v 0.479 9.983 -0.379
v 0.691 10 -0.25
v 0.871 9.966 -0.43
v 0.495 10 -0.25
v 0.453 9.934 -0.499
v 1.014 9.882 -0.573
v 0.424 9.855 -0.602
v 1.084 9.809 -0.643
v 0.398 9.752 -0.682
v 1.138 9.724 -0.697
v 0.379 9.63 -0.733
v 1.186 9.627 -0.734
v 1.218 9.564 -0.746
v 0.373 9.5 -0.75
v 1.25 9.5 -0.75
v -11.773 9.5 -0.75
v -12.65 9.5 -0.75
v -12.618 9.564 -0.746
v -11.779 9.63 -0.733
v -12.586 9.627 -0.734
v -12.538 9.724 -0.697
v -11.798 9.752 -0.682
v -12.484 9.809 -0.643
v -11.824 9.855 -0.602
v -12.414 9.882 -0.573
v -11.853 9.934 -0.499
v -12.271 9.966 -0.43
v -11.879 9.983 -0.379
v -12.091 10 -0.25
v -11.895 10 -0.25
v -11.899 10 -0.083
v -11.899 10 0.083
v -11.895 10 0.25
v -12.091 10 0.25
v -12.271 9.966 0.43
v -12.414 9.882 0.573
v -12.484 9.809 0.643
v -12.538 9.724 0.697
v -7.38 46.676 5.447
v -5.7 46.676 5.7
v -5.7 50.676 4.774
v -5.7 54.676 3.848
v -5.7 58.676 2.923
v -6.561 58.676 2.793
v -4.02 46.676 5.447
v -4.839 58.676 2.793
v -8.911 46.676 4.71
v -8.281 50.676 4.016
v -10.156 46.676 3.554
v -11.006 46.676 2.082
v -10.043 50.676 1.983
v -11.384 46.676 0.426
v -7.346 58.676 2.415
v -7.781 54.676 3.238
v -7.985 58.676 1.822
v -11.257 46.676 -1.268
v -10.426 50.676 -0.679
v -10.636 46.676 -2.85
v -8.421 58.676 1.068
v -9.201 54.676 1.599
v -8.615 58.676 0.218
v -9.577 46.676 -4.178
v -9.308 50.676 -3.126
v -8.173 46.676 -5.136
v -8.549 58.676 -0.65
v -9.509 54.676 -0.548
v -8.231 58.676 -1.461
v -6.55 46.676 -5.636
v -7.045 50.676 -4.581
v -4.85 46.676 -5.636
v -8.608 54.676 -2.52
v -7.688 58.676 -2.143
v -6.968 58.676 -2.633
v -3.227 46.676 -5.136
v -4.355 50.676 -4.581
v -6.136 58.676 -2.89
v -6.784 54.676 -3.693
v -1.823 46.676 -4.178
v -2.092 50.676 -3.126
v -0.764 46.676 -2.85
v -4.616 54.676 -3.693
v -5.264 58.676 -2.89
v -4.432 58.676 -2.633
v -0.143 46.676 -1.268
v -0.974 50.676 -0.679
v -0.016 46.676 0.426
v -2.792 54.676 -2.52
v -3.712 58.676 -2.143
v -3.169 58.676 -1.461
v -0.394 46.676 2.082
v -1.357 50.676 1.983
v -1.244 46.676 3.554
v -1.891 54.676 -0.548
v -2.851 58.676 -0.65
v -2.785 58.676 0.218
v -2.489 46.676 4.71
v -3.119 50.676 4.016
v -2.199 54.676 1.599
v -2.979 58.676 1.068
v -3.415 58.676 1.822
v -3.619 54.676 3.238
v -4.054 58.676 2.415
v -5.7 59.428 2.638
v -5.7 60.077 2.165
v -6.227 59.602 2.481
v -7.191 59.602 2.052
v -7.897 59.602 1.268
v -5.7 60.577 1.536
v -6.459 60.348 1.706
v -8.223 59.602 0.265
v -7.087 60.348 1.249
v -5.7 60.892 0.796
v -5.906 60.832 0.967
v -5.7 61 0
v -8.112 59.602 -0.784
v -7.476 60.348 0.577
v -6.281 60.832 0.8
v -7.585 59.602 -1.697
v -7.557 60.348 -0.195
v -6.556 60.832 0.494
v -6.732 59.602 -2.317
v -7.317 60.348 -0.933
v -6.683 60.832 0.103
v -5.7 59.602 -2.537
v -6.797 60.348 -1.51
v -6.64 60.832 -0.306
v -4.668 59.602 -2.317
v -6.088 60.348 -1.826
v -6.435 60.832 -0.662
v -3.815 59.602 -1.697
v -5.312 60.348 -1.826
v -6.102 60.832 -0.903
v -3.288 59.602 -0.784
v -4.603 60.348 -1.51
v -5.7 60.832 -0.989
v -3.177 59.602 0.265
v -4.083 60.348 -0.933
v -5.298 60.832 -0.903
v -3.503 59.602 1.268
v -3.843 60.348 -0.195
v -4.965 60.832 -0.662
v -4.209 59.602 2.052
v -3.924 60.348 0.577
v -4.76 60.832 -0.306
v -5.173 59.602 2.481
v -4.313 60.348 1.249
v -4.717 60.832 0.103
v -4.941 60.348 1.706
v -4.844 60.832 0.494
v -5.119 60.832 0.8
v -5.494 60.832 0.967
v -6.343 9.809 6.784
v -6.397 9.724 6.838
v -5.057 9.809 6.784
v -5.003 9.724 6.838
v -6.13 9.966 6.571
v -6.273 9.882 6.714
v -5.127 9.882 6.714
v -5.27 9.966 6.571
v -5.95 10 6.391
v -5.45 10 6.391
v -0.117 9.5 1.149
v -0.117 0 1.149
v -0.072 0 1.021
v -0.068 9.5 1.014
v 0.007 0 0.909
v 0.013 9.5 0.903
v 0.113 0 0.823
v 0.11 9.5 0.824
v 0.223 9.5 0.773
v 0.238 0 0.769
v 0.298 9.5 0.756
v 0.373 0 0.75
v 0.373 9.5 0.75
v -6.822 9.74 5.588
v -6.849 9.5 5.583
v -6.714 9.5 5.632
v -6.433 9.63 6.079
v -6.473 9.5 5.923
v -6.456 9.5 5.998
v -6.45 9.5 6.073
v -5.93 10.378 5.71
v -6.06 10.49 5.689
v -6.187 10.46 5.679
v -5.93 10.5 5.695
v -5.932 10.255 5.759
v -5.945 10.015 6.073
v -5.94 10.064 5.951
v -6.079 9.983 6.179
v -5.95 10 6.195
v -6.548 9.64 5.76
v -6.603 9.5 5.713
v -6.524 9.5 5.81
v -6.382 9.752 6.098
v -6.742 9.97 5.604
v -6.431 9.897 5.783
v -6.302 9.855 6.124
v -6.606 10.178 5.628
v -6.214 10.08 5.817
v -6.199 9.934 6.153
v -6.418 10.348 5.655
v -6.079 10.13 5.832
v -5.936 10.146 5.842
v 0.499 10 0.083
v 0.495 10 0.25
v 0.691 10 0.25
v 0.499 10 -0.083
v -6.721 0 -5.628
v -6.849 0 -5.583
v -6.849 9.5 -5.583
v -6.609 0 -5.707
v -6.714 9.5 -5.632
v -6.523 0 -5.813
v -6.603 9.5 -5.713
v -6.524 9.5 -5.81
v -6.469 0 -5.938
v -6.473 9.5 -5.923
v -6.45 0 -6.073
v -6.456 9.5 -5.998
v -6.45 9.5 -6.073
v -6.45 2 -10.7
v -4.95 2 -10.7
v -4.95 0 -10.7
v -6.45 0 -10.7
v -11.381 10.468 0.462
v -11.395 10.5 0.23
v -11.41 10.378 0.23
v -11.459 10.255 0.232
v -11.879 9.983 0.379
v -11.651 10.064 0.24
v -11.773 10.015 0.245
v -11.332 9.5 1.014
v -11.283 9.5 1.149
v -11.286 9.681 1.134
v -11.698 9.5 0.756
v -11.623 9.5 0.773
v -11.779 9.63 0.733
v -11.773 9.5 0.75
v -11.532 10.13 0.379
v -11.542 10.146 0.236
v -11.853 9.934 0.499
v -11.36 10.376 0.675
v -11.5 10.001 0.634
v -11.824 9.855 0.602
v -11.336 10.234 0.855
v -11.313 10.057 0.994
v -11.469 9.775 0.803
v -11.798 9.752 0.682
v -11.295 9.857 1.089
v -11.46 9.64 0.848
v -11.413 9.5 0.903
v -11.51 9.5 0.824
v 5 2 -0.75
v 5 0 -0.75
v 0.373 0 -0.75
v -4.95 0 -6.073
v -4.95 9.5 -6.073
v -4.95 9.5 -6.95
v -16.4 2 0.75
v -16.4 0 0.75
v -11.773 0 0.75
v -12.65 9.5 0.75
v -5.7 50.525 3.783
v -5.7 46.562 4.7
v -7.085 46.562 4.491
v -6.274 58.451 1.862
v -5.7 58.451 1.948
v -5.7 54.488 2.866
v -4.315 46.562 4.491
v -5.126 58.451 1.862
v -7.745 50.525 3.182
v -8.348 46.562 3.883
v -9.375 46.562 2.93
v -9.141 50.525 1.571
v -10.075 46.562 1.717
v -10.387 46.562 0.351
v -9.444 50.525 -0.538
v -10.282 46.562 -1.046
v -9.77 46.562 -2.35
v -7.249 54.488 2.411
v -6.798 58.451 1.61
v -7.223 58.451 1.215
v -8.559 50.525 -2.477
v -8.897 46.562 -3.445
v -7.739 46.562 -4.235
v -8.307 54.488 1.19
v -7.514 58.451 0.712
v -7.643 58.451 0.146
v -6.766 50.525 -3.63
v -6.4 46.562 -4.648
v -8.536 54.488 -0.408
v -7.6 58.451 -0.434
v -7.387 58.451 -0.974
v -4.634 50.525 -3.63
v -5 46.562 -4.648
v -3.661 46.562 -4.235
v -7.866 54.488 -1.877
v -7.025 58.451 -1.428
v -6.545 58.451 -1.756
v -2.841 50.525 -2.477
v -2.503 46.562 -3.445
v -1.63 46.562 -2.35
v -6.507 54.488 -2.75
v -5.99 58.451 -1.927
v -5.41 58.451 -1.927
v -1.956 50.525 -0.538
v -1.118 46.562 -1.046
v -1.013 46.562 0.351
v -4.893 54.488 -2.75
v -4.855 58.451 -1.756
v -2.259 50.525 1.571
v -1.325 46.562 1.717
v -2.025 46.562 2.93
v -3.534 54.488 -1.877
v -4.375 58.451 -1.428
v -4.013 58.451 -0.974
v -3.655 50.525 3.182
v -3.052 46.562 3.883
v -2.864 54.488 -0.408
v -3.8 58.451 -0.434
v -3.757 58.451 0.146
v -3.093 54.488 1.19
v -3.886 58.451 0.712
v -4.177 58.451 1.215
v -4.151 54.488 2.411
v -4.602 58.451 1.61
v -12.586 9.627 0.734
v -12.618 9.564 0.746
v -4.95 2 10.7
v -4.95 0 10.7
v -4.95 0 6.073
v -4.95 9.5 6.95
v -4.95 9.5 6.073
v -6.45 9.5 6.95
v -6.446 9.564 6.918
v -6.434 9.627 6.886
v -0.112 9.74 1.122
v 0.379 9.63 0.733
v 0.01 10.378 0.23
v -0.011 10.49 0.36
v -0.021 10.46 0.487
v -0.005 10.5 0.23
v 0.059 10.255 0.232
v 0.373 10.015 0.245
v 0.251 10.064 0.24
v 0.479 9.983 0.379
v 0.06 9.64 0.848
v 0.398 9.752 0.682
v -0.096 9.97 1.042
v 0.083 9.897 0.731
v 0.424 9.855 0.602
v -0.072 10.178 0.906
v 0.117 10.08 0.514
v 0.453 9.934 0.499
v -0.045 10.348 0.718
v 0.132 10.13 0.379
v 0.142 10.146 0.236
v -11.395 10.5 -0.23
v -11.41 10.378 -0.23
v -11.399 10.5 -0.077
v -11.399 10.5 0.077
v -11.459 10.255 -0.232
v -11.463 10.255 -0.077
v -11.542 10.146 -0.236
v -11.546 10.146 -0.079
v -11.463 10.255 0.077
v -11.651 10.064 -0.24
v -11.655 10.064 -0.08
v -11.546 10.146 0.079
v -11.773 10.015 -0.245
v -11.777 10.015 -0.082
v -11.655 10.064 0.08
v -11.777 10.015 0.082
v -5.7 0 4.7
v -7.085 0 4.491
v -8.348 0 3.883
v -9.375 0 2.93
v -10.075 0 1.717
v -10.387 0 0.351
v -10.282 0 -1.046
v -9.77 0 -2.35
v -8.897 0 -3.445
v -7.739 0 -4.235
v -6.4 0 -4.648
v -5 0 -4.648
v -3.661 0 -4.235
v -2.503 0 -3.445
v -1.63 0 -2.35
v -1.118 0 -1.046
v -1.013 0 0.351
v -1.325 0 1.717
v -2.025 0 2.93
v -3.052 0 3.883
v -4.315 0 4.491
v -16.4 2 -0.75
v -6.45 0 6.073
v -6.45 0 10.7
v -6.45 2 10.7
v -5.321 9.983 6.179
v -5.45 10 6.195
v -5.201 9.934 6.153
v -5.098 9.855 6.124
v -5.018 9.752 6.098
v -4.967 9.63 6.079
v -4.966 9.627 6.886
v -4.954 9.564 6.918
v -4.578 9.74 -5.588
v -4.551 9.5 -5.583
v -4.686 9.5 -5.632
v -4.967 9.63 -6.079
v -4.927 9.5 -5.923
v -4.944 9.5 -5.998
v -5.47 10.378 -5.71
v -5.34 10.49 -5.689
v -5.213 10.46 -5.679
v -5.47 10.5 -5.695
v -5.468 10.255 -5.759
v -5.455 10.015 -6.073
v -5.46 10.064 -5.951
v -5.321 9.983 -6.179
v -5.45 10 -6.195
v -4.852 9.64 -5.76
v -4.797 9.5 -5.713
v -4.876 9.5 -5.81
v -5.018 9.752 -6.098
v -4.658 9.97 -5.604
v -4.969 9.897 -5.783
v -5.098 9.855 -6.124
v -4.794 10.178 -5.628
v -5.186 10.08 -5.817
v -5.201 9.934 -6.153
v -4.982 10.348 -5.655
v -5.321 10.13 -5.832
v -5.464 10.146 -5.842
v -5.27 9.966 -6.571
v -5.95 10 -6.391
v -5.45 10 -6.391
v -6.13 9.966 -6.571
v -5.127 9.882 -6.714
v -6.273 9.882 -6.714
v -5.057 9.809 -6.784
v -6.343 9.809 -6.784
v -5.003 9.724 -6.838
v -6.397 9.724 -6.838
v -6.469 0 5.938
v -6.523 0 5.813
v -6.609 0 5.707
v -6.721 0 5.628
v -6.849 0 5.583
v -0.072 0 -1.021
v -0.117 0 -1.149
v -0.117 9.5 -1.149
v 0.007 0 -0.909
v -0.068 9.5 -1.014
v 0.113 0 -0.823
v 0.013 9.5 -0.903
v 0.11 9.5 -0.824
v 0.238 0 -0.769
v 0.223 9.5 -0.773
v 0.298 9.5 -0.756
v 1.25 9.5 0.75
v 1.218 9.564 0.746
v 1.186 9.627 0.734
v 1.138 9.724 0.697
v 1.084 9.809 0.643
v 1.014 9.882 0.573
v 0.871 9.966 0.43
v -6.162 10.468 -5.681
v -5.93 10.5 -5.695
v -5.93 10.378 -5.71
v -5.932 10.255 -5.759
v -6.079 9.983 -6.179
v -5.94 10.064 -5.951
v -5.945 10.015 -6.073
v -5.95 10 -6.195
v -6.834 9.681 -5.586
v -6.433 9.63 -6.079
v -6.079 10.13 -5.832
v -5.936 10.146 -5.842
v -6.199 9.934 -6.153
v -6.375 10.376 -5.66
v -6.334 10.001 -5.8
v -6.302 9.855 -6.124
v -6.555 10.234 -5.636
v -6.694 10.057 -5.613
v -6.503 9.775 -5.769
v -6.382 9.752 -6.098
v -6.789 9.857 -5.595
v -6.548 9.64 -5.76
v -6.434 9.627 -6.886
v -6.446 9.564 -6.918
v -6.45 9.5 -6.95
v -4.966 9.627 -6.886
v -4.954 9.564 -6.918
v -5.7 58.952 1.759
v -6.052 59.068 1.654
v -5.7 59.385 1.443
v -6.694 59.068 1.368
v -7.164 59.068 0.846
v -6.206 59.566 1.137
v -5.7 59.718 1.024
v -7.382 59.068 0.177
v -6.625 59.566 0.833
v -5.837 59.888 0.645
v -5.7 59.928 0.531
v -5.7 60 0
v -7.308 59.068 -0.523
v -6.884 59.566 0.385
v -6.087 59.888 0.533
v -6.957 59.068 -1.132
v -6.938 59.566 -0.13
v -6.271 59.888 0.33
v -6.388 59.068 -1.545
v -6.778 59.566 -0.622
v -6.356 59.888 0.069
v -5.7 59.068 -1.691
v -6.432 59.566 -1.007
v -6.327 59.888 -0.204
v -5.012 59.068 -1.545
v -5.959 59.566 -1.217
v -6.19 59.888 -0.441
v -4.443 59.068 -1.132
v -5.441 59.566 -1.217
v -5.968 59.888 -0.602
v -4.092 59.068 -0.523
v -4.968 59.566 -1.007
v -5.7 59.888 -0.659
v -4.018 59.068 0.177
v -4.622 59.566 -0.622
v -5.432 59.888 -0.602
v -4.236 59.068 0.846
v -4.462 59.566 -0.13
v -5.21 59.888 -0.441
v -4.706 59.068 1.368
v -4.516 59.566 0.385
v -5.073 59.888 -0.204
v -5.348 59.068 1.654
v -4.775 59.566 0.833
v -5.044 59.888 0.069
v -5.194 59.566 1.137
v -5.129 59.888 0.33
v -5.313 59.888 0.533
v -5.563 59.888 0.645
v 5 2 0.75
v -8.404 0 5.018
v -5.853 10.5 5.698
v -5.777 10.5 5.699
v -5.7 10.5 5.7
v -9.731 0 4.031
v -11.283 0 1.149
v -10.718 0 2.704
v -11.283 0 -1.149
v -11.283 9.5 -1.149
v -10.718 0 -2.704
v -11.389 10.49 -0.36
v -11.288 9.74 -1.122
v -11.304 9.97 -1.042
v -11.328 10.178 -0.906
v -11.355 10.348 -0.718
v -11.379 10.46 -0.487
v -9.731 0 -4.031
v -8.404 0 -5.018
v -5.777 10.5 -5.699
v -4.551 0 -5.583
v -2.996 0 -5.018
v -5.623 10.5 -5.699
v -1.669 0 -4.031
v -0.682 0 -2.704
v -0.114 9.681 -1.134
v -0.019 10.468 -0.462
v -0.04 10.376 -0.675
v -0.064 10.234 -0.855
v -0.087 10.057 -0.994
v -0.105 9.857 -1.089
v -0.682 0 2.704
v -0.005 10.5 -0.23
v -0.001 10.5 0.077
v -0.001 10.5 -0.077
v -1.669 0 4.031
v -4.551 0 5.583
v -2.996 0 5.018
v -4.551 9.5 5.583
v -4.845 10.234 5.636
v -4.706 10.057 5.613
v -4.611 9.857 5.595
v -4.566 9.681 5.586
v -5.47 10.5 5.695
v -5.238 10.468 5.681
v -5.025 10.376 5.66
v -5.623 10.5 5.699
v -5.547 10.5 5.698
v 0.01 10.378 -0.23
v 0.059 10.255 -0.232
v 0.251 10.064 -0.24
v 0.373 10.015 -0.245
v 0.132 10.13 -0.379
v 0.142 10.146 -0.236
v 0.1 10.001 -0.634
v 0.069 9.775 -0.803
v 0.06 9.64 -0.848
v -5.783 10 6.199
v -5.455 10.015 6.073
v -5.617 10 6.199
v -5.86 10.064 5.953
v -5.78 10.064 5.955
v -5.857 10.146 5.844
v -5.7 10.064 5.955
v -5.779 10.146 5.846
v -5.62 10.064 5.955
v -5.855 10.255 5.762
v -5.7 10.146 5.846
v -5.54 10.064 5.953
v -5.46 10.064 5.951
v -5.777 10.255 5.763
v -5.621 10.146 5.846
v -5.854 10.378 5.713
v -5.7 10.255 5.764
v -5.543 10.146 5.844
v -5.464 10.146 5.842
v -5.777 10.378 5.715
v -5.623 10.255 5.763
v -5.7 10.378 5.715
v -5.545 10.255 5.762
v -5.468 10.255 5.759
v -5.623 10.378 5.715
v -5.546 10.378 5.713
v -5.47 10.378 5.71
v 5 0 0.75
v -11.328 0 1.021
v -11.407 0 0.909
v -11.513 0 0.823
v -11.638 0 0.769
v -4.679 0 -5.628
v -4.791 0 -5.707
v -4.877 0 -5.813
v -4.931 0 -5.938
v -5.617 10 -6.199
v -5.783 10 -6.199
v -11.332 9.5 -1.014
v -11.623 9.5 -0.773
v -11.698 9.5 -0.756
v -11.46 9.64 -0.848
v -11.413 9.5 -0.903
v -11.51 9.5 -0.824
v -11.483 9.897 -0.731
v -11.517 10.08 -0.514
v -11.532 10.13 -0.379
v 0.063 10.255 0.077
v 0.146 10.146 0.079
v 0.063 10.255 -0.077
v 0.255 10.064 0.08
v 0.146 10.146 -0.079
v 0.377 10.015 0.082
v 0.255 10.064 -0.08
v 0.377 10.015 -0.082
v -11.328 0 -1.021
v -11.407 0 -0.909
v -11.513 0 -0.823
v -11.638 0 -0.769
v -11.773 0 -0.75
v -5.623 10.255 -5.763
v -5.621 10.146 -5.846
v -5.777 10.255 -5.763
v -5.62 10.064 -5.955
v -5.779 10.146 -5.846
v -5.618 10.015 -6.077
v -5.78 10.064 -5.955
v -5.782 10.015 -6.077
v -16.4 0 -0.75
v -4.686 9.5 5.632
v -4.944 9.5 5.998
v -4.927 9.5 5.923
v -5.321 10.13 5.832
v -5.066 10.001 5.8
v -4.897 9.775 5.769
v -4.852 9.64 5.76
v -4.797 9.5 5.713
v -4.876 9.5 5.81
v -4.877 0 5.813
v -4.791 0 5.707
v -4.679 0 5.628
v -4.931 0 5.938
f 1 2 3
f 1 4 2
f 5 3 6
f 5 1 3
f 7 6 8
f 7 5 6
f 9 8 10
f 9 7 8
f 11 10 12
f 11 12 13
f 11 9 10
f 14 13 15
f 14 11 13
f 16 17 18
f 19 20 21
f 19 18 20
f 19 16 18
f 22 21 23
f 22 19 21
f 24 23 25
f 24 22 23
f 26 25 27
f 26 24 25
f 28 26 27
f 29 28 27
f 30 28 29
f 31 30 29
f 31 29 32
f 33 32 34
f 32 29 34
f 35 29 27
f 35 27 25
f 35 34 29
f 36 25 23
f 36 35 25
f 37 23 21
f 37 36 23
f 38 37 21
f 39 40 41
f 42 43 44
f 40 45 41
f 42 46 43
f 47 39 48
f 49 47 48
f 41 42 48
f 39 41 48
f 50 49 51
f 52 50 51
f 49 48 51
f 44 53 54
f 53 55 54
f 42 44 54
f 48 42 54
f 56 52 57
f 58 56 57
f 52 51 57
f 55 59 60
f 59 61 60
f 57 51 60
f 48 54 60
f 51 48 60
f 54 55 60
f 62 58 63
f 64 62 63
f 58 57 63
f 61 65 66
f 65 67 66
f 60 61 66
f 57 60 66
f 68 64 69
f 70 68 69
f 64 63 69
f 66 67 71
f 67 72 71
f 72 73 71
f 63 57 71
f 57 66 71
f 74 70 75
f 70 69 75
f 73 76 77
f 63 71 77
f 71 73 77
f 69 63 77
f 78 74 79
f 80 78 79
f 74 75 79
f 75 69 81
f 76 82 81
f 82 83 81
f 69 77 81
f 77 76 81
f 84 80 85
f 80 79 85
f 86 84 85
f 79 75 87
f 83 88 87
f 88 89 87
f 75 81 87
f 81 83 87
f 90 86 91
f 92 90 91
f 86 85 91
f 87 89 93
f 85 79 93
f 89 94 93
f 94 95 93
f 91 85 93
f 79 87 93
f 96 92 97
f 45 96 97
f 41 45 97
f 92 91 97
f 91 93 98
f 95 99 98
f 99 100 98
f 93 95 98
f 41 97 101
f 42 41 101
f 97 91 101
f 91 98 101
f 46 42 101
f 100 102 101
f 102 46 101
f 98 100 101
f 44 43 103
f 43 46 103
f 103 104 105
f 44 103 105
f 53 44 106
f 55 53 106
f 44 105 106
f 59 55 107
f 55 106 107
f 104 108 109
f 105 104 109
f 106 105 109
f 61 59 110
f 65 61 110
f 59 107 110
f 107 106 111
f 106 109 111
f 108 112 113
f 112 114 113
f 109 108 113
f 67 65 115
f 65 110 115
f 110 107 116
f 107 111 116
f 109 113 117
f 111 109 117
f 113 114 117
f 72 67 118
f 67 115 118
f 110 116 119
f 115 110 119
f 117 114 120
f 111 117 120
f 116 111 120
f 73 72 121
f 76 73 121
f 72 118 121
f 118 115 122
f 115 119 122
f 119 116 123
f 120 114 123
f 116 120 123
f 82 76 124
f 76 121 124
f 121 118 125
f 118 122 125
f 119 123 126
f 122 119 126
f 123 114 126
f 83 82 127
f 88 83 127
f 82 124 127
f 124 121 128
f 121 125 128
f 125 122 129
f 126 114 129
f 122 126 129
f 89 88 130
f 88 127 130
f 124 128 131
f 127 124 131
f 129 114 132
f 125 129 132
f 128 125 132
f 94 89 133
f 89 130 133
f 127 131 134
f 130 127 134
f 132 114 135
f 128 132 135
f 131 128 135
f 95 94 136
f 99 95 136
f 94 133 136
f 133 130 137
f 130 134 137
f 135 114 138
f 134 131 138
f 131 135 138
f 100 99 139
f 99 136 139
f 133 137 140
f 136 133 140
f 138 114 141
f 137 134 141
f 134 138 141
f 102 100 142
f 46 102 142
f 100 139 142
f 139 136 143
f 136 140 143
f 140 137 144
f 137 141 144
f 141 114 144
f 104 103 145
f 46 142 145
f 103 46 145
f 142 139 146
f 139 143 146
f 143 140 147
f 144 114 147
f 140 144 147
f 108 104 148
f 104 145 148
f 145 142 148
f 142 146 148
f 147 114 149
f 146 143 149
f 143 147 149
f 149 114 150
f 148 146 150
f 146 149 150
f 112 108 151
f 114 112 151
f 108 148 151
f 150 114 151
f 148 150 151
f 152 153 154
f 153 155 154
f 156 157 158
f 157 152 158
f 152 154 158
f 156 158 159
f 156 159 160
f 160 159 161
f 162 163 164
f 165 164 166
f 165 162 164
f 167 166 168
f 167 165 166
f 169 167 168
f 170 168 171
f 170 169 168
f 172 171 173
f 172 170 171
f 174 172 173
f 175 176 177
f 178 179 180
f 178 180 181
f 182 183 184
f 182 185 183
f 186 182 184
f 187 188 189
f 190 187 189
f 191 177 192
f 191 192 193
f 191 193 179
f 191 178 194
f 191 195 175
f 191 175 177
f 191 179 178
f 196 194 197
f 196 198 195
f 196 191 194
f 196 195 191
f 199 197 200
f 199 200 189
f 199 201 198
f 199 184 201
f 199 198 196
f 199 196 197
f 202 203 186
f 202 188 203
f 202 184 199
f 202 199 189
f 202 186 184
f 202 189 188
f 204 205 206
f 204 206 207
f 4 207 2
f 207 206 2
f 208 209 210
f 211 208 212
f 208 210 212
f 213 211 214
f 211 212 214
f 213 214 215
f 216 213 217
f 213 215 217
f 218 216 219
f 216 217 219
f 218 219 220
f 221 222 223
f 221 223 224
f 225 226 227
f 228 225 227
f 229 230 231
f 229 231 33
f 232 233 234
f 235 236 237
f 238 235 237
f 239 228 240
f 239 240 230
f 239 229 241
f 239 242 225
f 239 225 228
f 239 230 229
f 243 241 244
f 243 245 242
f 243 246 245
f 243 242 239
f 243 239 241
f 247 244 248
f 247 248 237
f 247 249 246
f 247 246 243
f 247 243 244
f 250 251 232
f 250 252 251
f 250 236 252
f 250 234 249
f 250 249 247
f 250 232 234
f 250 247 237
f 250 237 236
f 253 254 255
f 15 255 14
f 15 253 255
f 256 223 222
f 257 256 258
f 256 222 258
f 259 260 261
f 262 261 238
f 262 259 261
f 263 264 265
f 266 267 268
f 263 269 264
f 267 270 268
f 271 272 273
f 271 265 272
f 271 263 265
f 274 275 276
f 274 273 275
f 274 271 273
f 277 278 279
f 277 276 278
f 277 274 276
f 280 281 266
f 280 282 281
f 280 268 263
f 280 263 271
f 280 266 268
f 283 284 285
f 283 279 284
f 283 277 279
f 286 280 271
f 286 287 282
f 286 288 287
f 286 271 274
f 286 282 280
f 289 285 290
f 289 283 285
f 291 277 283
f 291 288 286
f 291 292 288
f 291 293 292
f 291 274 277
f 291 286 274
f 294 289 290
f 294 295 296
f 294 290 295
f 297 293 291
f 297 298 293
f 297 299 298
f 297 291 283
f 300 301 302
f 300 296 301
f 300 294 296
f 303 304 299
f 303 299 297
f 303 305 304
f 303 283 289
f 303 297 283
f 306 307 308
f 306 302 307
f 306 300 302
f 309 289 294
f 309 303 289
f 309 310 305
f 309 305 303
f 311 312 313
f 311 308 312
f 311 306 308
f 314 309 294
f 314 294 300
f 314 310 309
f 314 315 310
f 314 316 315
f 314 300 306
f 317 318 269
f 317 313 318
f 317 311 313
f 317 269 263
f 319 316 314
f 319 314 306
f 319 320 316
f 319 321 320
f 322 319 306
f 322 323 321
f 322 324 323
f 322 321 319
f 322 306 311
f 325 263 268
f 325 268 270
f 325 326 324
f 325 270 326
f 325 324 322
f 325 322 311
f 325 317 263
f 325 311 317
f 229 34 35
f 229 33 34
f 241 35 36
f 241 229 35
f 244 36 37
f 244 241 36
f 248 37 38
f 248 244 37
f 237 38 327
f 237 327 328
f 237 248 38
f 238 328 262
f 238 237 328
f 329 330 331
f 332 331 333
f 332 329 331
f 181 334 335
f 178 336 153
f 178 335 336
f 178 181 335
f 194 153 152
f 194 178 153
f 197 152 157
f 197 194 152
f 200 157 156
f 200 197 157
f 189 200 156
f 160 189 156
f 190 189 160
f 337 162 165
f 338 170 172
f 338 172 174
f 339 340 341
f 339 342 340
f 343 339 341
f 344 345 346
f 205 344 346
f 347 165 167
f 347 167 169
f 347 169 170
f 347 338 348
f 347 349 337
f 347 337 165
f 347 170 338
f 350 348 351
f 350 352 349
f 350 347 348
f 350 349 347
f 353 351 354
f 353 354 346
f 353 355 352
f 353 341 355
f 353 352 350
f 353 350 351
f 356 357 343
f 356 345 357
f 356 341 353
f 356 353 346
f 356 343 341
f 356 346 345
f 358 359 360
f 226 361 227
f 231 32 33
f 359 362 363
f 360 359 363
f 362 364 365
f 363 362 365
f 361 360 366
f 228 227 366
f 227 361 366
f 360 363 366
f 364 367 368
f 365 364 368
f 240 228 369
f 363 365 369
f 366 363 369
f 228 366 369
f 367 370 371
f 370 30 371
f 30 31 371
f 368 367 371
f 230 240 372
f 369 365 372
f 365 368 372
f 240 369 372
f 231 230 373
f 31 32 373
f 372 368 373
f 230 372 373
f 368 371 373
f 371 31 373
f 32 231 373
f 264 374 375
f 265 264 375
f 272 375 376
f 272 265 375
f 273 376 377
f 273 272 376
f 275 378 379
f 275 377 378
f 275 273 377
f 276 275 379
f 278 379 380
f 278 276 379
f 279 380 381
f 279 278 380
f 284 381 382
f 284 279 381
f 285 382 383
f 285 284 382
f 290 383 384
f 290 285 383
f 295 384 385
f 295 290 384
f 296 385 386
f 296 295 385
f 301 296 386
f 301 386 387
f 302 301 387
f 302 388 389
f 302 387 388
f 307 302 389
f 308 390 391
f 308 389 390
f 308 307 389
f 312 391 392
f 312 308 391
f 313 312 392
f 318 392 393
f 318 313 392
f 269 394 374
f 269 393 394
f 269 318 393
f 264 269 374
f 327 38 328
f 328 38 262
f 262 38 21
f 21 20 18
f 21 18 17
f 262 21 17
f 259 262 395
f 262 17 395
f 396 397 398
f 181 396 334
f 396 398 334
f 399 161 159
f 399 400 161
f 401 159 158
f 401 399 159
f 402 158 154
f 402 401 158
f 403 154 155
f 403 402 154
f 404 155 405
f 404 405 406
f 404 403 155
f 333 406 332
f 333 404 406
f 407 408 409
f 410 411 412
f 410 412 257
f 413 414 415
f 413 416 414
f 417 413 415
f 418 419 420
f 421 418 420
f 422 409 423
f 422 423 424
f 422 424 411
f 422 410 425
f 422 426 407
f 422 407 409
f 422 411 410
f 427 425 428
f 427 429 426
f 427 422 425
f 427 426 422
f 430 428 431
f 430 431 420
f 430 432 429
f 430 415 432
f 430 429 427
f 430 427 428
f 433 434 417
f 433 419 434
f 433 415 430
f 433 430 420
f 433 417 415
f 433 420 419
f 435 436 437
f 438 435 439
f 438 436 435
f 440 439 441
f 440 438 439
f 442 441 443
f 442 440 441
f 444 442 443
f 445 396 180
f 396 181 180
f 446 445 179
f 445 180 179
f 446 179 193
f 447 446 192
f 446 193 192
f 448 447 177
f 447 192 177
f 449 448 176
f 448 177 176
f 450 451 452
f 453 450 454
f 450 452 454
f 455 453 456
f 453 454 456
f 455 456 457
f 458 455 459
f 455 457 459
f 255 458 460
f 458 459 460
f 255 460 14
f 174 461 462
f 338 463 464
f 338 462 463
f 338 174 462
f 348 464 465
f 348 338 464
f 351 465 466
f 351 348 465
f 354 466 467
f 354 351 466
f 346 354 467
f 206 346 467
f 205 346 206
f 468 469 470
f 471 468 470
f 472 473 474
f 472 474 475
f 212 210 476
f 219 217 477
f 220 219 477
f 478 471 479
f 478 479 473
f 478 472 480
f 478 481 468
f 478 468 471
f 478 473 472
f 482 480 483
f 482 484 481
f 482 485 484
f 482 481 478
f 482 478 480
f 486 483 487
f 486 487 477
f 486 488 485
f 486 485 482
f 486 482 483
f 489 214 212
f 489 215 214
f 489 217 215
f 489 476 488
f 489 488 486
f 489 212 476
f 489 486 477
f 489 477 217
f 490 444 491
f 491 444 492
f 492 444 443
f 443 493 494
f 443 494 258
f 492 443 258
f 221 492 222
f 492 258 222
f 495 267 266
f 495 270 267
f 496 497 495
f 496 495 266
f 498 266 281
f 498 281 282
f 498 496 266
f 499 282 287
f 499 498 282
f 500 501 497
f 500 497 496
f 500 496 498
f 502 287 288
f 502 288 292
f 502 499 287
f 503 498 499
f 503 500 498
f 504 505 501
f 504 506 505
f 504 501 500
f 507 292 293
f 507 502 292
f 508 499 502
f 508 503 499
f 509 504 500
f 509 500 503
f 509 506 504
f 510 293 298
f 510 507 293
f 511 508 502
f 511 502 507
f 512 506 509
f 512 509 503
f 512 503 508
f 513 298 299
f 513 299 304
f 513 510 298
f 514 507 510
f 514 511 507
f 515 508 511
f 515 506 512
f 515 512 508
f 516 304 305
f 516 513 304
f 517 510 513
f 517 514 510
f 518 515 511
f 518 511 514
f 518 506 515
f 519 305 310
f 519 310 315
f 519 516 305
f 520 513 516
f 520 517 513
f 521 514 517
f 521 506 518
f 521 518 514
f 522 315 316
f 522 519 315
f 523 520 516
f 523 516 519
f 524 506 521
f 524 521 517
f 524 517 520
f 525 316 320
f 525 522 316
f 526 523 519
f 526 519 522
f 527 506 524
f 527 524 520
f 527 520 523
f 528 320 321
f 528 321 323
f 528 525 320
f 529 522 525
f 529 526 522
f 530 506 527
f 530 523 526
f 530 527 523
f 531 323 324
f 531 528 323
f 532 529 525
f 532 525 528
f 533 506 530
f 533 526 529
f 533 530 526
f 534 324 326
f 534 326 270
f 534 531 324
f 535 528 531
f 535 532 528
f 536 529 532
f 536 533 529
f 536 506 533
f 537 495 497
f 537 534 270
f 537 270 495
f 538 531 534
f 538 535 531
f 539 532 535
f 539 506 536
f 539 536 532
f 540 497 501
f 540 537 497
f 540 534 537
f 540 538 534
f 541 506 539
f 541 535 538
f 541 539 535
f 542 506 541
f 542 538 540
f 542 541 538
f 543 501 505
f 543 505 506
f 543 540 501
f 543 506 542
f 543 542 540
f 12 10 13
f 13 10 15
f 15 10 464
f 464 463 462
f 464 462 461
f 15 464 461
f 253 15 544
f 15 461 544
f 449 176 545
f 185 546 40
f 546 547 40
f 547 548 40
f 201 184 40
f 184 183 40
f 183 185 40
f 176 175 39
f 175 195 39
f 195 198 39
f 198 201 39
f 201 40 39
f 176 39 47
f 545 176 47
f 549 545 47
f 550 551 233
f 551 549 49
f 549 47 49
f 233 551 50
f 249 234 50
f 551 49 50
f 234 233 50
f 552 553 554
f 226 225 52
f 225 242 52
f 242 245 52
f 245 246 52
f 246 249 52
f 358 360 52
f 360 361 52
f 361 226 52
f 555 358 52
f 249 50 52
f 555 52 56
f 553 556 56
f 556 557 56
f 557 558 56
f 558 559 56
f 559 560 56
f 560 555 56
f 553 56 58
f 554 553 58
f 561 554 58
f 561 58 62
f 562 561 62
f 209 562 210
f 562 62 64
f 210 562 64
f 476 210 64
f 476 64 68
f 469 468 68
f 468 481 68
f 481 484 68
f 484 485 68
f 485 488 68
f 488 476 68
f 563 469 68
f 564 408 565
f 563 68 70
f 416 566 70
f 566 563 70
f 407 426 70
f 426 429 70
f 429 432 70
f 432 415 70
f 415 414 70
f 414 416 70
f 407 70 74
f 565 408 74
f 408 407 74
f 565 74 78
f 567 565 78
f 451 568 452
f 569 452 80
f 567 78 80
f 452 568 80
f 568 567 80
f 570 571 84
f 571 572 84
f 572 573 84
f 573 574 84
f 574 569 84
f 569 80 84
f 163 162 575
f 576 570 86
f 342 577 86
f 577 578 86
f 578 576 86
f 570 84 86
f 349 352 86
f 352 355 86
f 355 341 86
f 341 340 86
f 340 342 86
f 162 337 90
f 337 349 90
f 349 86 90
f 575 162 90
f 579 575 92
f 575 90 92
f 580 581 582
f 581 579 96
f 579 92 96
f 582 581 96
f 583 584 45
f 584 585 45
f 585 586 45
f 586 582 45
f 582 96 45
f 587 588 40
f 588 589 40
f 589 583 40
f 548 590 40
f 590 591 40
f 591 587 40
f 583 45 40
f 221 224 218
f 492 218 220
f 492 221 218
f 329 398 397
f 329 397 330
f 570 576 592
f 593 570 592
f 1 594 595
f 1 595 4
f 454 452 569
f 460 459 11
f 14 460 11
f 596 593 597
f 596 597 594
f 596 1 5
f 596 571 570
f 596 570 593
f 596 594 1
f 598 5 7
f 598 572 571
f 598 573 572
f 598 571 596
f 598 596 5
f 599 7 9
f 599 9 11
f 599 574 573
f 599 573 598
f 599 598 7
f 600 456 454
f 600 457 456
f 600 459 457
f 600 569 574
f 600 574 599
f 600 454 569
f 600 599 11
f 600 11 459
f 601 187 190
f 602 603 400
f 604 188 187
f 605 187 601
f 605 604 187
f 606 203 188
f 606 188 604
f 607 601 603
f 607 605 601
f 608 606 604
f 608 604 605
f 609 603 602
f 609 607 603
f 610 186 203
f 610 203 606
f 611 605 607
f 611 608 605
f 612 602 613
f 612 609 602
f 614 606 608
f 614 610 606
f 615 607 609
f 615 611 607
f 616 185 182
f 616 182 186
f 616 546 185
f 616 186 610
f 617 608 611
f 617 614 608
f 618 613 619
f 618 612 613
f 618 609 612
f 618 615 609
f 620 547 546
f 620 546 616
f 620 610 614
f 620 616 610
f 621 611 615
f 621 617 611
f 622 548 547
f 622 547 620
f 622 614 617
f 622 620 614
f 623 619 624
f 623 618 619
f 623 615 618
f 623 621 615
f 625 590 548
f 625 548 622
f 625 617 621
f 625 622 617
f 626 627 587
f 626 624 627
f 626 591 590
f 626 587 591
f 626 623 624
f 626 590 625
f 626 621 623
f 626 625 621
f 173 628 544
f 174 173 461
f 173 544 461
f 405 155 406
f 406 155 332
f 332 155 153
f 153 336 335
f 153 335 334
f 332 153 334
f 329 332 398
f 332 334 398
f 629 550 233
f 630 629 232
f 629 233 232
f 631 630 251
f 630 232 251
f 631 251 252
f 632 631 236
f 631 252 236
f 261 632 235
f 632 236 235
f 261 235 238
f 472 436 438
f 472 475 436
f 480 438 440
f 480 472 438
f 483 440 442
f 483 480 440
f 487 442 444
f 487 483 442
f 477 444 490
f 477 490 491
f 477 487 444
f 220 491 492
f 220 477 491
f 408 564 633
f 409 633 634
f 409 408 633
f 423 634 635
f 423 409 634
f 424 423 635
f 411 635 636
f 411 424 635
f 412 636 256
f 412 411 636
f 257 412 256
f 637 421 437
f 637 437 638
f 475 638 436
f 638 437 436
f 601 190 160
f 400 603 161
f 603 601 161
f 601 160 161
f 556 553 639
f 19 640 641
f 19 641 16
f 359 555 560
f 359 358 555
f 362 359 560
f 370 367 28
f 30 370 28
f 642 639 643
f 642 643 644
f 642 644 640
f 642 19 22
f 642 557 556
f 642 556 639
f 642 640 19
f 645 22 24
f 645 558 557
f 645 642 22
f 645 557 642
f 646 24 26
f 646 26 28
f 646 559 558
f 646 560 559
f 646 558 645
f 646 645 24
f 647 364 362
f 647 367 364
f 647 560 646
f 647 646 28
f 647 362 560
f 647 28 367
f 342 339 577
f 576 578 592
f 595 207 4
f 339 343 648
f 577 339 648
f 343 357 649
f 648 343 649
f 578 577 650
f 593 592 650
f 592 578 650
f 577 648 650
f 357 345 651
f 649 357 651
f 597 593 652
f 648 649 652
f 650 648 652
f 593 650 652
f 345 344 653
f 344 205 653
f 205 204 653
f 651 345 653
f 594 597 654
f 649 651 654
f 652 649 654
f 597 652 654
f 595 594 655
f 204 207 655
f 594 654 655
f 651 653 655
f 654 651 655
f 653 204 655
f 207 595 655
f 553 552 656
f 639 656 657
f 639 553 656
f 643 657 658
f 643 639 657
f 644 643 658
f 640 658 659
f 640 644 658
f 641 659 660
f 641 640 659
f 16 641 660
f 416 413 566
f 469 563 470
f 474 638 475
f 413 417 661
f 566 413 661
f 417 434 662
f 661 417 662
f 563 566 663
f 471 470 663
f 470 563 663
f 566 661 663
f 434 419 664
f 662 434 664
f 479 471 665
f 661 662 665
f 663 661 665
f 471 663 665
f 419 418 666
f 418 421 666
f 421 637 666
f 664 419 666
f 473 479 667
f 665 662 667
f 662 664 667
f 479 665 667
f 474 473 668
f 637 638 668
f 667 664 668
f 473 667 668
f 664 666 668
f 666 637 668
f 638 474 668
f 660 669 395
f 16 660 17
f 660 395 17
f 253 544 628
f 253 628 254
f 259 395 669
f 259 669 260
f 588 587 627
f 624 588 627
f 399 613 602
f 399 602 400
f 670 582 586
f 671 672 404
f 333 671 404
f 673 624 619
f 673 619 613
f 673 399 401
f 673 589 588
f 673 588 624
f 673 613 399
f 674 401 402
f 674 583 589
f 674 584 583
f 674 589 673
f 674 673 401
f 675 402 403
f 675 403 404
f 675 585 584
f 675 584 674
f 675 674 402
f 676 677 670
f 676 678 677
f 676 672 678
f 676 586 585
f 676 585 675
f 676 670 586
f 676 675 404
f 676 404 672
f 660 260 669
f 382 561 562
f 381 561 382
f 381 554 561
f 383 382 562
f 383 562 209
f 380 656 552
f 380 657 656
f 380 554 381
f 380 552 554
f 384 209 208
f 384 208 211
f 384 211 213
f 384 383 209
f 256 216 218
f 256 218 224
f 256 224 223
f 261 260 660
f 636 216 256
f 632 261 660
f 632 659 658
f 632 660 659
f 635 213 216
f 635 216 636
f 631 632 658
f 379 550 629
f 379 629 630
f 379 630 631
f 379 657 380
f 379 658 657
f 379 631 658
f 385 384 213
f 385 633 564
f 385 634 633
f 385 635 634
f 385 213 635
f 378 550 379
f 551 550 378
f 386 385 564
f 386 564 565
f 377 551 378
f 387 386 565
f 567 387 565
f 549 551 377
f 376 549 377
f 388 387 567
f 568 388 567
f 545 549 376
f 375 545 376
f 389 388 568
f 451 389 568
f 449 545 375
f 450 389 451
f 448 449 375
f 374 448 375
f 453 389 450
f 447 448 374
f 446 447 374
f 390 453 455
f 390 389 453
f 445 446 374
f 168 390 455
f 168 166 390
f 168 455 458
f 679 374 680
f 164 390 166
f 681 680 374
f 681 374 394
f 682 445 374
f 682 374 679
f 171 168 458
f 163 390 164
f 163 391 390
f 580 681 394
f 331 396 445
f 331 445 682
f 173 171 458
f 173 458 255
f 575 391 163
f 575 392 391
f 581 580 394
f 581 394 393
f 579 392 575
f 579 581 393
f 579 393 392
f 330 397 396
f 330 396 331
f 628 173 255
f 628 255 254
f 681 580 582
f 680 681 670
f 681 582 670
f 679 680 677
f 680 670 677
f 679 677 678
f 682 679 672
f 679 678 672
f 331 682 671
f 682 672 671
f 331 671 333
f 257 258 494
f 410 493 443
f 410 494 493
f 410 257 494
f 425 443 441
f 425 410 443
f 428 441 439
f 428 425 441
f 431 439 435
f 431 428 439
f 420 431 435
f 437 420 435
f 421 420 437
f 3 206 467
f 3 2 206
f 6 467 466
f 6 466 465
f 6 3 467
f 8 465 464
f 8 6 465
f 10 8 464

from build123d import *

# Parameters (mm, degrees)
SHELL1_T                 = -1
BOSS_EXTRUDE2_REACH      = 69.317
BOSS_EXTRUDE2_END_RADIUS = 5.7
BOSS_EXTRUDE2_START      = 5
SKETCH4_W                = 1.5
SKETCH4_H                = 10
CUT_EXTRUDE1_DEPTH       = 1.5
CIRPATTERN1_COUNT        = 4
FILLET1_R                = 0.5


with BuildPart() as part:
    # Sketch2 → Revolve1 (revolve)
    with BuildSketch(Plane.XY, mode=Mode.PRIVATE) as revolve1_sk:
        with BuildLine():
            Line((0, 46.676434016), (-2.777255225, 58.676434016))
            ThreePointArc((-2.777255225, 58.676434016), (-3.833091064, 60.348329411), (-5.7, 61))
            Line((-5.7, 61), (-5.7, 58))
            Line((-5.7, 58), (-5.7, 0))
            Line((-5.7, 0), (0, 0))
            Line((0, 0), (0, 46.676434016))
        make_face()
    revolve(revolve1_sk.sketch.rotate(Axis((-5.7, 58, 0), (0, -1, 0)), 90), axis=Axis((-5.7, 58, 0), (0, -1, 0)))

    # Shell1
    shell1_openings = [part.faces().sort_by_distance(p)[0] for p in [
        (-5.7, 0, 0),
    ]]
    offset(amount=SHELL1_T, openings=shell1_openings, kind=Kind.INTERSECTION)

    # Boss-Extrude2: up to this cylinder (the profile starts outside it)
    boss_extrude2_end = Plane(origin=(-5.7, 5, 0), z_dir=(0, 1, 0)) * Cylinder(BOSS_EXTRUDE2_END_RADIUS, 151.034, mode=Mode.PRIVATE)
    # Sketch4 → Boss-Extrude2 (add, up to the surface)
    with BuildSketch(Plane(origin=(0, 0, 0), x_dir=(0, 0, -1), z_dir=(1, 0, 0)).offset(BOSS_EXTRUDE2_START), mode=Mode.PRIVATE) as boss_extrude2_sk1:
        with Locations((0, 5)):
            Rectangle(SKETCH4_W, SKETCH4_H)
    boss_extrude2_tool1 = extrude(boss_extrude2_sk1.sketch, amount=-BOSS_EXTRUDE2_REACH, mode=Mode.PRIVATE) - boss_extrude2_end
    boss_extrude2 = boss_extrude2_tool1.solids().sort_by_distance((5, 5, 0))[0]
    add(boss_extrude2)

    # Sketch5 → Cut-Extrude1 (cut)
    with BuildSketch(Plane.XY.offset(0.75)):
        Polygon((1, 10), (5, 2), (5, 10), align=None)
    cut_extrude1 = extrude(amount=-CUT_EXTRUDE1_DEPTH, mode=Mode.SUBTRACT)

    # CirPattern1: Boss-Extrude2, Cut-Extrude1 ×4 about axis
    cirpattern1_axis = Axis((-5.7, 0, 0), (0, 1, 0))
    add([boss_extrude2.rotate(cirpattern1_axis, i * 360 / CIRPATTERN1_COUNT) for i in range(1, CIRPATTERN1_COUNT)])
    add([cut_extrude1.rotate(cirpattern1_axis, i * 360 / CIRPATTERN1_COUNT) for i in range(1, CIRPATTERN1_COUNT)], mode=Mode.SUBTRACT)

    # Fillet1
    fillet1_edges = [part.edges().sort_by_distance(p)[0] for p in [
        (-0.049557539, 5, -0.75),
        (0.47522123, 10, -0.75),
        (0, 10, 0),
        (0.47522123, 10, 0.75),
        (-0.049557539, 5, 0.75),
        (1, 10, 0),
        (-6.45, 5, -5.650442461),
        (-6.45, 10, -6.17522123),
        (-5.7, 10, -5.7),
        (-4.95, 10, -6.17522123),
        (-4.95, 5, -5.650442461),
        (-11.350442461, 5, 0.75),
        (-11.87522123, 10, 0.75),
        (-11.4, 10, 0),
        (-11.87522123, 10, -0.75),
        (-11.350442461, 5, -0.75),
        (-6.45, 5, 5.650442461),
        (-5.324182242, 10, 5.687597121),
        (-6.45, 10, 6.17522123),
        (-4.95, 5, 5.650442461),
        (-4.95, 10, 6.17522123),
        (-5.7, 10, -6.7),
        (-12.4, 10, 0),
        (-5.7, 10, 6.7),
    ]]
    fillet(fillet1_edges, radius=FILLET1_R)


solid = part.part
